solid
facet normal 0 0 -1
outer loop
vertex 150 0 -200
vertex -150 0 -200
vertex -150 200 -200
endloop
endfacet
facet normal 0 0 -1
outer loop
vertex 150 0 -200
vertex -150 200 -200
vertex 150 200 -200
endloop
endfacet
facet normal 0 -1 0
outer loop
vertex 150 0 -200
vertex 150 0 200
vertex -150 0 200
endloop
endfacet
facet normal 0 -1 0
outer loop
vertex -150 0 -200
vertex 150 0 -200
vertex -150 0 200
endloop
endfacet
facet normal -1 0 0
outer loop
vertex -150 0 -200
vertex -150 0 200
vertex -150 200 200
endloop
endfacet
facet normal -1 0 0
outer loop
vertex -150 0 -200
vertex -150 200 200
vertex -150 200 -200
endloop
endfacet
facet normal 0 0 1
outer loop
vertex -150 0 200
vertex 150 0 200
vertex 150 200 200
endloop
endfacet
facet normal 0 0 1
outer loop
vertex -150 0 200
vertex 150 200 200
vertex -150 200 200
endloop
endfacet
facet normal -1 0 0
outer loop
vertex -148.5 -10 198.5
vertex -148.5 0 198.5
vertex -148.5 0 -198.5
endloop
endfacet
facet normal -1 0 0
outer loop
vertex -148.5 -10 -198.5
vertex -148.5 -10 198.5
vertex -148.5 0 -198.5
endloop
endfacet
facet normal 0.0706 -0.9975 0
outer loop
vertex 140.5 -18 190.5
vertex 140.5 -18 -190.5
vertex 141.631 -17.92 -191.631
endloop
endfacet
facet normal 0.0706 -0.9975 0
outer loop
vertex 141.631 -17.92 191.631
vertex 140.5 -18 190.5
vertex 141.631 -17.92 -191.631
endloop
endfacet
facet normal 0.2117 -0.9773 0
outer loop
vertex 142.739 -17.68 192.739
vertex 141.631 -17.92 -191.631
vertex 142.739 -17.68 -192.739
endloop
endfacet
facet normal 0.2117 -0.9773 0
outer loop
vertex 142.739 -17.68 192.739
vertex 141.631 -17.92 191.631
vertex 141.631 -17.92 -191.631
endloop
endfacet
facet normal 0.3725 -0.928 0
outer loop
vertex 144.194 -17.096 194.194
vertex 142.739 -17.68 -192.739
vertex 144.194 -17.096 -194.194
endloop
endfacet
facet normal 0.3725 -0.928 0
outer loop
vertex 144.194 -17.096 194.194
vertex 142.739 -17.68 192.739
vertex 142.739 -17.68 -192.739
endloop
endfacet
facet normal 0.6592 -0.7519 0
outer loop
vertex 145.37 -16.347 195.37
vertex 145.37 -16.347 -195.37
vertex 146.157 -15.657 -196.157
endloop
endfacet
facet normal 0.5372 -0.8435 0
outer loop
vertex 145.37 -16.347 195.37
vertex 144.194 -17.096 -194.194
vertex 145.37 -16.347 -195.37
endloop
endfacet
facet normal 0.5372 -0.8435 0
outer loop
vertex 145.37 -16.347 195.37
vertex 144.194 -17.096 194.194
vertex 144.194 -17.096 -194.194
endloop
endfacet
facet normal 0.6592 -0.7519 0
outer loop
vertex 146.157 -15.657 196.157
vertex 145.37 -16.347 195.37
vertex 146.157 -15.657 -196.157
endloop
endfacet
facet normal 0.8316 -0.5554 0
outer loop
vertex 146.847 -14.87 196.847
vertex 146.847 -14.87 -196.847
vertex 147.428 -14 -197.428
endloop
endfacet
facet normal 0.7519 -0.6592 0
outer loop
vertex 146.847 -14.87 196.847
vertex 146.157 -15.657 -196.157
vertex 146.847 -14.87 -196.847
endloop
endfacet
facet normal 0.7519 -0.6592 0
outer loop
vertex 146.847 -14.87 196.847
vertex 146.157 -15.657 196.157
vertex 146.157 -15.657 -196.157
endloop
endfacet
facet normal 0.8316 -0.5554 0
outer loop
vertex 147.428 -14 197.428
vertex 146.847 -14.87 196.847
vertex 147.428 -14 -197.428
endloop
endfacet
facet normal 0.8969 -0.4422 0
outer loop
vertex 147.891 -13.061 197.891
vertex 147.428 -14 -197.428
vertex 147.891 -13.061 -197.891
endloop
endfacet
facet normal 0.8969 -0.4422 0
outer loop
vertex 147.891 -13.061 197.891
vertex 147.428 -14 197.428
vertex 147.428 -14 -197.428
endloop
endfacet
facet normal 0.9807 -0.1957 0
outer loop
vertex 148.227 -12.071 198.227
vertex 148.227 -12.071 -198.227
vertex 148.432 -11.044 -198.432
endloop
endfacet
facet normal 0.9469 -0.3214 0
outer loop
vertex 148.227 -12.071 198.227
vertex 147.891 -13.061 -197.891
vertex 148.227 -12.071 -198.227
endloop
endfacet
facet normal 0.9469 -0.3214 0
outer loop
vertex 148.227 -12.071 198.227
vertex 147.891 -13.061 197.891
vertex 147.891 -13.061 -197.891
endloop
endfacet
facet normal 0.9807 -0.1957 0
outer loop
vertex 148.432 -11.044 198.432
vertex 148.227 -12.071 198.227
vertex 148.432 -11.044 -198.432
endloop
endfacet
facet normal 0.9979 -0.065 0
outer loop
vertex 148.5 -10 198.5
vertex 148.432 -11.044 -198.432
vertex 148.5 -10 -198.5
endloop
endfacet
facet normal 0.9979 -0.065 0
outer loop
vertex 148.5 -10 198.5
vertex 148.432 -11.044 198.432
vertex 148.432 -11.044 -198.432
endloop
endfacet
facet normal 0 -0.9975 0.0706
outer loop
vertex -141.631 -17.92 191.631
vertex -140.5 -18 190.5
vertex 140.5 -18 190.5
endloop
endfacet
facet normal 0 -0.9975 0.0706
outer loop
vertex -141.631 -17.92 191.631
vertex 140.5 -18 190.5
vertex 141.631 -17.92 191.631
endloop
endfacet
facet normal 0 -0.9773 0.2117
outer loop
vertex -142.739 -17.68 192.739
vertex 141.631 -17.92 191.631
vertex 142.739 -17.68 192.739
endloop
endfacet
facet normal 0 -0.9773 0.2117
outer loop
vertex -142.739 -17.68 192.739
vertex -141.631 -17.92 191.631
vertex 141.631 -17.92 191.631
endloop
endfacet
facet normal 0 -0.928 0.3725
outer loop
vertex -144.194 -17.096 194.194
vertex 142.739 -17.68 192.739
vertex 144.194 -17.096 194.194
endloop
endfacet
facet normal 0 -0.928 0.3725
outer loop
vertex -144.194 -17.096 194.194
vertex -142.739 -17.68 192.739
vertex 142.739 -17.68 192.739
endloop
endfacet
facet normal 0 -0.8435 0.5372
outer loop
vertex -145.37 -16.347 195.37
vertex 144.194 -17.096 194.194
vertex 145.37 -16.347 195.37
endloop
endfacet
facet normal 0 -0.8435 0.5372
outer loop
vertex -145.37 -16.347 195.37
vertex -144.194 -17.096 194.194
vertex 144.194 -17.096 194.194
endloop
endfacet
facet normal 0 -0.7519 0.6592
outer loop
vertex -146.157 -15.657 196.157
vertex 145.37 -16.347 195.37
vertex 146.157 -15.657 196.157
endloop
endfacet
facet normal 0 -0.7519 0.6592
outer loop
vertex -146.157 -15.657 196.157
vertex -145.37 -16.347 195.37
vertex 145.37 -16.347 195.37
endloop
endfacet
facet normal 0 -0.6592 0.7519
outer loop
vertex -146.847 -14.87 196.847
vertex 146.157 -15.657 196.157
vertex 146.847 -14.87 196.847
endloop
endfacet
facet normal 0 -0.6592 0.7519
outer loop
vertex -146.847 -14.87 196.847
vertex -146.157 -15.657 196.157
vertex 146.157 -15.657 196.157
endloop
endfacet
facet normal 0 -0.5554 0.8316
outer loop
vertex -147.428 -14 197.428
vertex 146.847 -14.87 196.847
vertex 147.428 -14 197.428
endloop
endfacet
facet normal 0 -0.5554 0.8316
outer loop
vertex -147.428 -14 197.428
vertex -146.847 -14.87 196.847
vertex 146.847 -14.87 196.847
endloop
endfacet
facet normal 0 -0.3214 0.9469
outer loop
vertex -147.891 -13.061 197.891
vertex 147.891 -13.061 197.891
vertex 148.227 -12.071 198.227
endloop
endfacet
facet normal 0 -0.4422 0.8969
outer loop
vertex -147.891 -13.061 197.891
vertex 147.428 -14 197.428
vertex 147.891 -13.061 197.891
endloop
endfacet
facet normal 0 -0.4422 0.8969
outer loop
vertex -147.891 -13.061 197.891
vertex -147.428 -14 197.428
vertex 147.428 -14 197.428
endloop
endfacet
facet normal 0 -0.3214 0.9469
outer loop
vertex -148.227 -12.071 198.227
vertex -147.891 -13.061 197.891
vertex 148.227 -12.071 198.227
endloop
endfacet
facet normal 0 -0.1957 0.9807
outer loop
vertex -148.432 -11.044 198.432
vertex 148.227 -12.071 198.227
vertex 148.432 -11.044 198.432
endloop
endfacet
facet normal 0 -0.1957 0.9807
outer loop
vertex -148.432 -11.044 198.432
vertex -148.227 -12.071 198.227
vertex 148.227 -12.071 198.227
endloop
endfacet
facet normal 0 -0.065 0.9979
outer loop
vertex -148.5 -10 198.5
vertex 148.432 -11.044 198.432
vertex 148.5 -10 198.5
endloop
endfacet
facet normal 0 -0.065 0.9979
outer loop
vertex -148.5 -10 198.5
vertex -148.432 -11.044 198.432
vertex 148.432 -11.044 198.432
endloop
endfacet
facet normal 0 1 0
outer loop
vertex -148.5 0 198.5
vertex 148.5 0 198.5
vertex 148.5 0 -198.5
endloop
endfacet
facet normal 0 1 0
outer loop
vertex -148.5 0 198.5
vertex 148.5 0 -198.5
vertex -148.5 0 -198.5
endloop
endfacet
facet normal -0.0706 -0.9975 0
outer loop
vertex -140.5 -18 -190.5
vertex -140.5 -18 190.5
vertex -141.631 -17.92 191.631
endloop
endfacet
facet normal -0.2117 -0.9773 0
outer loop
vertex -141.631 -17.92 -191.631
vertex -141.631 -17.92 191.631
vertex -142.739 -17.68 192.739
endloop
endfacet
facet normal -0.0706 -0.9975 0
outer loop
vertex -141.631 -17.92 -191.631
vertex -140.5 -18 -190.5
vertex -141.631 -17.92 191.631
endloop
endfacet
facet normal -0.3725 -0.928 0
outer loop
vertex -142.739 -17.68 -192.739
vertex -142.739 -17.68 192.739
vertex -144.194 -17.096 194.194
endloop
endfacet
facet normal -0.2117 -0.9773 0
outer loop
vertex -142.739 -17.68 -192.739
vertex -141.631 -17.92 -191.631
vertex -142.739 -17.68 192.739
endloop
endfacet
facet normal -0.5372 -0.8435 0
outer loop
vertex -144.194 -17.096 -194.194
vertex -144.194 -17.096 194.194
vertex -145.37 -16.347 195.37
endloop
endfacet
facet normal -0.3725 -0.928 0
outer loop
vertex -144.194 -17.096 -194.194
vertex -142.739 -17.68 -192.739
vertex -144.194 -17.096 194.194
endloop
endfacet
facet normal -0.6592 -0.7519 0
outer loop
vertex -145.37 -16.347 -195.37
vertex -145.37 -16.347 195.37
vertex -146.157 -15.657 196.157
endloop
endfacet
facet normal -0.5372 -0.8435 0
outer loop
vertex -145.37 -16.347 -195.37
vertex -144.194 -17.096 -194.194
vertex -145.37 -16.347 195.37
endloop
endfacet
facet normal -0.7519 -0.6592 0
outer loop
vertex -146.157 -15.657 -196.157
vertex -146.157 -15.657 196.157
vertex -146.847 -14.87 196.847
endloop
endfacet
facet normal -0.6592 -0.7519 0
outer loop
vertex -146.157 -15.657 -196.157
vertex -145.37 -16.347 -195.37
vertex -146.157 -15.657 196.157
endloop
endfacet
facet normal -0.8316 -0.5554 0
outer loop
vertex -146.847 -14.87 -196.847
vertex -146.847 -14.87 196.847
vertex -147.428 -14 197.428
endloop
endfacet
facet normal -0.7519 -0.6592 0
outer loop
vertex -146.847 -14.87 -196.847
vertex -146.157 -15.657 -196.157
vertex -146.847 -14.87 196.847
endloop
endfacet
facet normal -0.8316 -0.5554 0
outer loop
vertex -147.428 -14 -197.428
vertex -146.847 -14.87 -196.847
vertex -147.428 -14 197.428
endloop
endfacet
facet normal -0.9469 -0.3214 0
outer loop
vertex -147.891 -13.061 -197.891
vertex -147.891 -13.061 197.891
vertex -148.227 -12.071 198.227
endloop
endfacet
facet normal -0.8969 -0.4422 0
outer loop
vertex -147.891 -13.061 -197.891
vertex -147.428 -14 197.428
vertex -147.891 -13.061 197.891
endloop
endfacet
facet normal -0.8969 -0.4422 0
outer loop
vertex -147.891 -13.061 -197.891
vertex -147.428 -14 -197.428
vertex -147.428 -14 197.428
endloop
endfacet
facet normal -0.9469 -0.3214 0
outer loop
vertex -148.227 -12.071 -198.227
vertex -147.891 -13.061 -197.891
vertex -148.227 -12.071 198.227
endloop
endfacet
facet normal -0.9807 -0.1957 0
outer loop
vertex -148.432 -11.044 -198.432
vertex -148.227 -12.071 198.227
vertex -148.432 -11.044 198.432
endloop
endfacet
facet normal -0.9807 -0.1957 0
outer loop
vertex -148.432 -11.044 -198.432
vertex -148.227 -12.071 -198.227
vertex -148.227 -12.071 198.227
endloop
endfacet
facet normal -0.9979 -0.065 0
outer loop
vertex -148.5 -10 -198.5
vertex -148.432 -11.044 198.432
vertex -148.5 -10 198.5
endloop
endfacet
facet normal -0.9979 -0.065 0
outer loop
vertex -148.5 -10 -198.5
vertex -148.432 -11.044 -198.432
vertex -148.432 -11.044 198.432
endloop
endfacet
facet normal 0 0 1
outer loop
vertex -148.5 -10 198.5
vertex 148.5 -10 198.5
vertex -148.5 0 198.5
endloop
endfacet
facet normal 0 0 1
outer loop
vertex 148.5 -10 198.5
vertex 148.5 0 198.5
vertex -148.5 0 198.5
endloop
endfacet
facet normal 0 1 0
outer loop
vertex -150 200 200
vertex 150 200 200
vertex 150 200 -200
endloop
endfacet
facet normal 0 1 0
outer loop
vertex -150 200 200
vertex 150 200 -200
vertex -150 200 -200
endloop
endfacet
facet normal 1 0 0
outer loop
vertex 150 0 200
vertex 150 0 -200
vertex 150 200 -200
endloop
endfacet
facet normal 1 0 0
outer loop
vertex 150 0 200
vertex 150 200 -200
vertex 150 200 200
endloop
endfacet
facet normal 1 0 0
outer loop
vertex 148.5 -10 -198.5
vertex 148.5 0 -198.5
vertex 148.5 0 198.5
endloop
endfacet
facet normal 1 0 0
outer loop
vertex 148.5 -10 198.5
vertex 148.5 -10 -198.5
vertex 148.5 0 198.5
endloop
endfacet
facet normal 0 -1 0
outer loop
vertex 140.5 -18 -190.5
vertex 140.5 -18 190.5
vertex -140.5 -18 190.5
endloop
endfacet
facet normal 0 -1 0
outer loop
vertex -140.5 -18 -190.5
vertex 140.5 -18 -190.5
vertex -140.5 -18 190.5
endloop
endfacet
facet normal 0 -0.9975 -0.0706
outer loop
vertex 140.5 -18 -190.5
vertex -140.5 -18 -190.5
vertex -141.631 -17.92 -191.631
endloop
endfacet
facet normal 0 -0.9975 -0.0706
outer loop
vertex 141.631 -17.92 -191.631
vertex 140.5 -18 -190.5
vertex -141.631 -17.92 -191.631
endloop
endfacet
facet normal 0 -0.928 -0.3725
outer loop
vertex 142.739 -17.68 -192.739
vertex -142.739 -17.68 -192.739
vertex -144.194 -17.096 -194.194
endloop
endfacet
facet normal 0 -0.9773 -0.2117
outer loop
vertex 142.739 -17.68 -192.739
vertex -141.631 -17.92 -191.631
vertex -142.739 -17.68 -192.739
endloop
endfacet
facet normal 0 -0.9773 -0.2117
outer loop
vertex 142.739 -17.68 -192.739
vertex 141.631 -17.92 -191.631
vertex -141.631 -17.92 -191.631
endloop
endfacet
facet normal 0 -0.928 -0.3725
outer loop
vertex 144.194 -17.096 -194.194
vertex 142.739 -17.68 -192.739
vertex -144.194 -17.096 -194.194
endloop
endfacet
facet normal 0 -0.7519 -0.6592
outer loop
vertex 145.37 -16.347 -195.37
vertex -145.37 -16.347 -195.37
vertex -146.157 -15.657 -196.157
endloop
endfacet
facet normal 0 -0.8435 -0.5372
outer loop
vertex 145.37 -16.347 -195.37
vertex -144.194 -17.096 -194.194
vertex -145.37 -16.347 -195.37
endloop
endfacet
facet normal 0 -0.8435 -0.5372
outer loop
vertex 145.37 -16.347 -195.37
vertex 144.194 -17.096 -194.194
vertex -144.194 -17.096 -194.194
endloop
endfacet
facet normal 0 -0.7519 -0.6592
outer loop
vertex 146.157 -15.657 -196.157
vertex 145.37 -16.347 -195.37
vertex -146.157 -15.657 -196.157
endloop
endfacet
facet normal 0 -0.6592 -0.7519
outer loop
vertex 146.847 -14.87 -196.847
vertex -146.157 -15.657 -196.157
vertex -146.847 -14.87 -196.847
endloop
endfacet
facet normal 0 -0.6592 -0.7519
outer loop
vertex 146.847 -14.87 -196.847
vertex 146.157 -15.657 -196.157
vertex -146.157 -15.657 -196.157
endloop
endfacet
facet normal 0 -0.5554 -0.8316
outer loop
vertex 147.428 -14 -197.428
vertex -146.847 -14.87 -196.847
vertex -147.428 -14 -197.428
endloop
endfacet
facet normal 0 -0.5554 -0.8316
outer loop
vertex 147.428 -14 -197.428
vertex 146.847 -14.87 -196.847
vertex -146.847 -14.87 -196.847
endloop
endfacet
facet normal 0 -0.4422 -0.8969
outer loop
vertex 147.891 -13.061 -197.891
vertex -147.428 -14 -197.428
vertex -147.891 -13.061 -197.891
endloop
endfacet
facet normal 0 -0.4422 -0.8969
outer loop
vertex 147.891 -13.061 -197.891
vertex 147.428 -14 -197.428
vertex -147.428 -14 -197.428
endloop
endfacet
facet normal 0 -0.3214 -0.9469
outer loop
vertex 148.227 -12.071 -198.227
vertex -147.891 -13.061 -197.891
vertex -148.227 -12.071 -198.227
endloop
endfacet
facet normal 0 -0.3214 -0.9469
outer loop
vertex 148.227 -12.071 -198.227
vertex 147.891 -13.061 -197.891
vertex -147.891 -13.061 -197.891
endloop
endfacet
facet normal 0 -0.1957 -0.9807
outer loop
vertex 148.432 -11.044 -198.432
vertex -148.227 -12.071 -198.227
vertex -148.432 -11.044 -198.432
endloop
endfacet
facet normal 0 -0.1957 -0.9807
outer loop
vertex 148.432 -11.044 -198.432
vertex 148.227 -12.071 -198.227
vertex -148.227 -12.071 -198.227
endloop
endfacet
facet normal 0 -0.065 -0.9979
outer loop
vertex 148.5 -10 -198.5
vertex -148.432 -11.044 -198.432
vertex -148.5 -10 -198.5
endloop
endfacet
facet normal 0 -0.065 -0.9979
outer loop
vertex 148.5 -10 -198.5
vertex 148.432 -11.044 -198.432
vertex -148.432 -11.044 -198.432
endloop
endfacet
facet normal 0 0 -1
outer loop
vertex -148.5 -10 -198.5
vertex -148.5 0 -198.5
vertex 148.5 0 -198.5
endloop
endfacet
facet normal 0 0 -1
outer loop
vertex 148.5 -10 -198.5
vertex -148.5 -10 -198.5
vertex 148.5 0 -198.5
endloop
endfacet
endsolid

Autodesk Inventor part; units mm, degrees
ref_plane "YZ Plane" through (0, 0, 0) normal (1, 0, 0) x (0, 1, 0)
ref_plane "XZ Plane" through (0, 0, 0) normal (0, 1, 0) x (-1, 0, 0)
ref_plane "XY Plane" through (0, 0, 0) normal (0, 0, 1) x (1, 0, 0)
sketch "Sketch2" plane through (0, 0, 0) normal (0, 1, 0) x (-1, 0, 0)
  line L0 (150, -200) -> (-150, -200)
  line L1 (-150, -200) -> (-150, 200)
  line L2 (-150, 200) -> (150, 200)
  line L3 (150, 200) -> (150, -200)
  line L4 (150, -200) -> (-150, 200) construction
  line L5 (-150, -200) -> (150, 200) construction
  point P0 (0, 0)
  dimension "Width" = 300
  dimension "Height" = 400
sketch "Sketch1" plane through (0, 0, 0) normal (0, 1, 0) x (-1, 0, 0)
  line L0 (148.5, -198.5) -> (-148.5, -198.5)
  line L1 (-148.5, -198.5) -> (-148.5, 198.5)
  line L2 (-148.5, 198.5) -> (148.5, 198.5)
  line L3 (148.5, 198.5) -> (148.5, -198.5)
  line L4 (-150, 200) -> (150, 200) construction
  line L5 (150, 200) -> (150, -200) construction
  line L6 (150, -200) -> (-150, -200) construction
  line L7 (-150, -200) -> (-150, 200) construction
  point P0 (0, 0)
  dimension "Off_From_Top" = 1.5
  dimension "Off_From_Left" = 1.5
  dimension "Off_From_Bottom" = 1.5
  dimension "Off_From_Right" = 1.5
extrude "Extrusion1" add sketch "Sketch1" against normal blind 18
fillet "Fillet1" radius 8 4 edges at (0, -18, 198.5) (148.5, -18, 0) (0, -18, -198.5) (-148.5, -18, 0)
extrude "Extrusion2" add sketch "Sketch2" along normal blind 200 separate body
equation "\"Total_Offset\" = 0.001"
equation "\"Hinge_Gap\" = 0"
equation "\"Inset_Dist\" = 0"
properties part number "Painted Facade Skeleton"
